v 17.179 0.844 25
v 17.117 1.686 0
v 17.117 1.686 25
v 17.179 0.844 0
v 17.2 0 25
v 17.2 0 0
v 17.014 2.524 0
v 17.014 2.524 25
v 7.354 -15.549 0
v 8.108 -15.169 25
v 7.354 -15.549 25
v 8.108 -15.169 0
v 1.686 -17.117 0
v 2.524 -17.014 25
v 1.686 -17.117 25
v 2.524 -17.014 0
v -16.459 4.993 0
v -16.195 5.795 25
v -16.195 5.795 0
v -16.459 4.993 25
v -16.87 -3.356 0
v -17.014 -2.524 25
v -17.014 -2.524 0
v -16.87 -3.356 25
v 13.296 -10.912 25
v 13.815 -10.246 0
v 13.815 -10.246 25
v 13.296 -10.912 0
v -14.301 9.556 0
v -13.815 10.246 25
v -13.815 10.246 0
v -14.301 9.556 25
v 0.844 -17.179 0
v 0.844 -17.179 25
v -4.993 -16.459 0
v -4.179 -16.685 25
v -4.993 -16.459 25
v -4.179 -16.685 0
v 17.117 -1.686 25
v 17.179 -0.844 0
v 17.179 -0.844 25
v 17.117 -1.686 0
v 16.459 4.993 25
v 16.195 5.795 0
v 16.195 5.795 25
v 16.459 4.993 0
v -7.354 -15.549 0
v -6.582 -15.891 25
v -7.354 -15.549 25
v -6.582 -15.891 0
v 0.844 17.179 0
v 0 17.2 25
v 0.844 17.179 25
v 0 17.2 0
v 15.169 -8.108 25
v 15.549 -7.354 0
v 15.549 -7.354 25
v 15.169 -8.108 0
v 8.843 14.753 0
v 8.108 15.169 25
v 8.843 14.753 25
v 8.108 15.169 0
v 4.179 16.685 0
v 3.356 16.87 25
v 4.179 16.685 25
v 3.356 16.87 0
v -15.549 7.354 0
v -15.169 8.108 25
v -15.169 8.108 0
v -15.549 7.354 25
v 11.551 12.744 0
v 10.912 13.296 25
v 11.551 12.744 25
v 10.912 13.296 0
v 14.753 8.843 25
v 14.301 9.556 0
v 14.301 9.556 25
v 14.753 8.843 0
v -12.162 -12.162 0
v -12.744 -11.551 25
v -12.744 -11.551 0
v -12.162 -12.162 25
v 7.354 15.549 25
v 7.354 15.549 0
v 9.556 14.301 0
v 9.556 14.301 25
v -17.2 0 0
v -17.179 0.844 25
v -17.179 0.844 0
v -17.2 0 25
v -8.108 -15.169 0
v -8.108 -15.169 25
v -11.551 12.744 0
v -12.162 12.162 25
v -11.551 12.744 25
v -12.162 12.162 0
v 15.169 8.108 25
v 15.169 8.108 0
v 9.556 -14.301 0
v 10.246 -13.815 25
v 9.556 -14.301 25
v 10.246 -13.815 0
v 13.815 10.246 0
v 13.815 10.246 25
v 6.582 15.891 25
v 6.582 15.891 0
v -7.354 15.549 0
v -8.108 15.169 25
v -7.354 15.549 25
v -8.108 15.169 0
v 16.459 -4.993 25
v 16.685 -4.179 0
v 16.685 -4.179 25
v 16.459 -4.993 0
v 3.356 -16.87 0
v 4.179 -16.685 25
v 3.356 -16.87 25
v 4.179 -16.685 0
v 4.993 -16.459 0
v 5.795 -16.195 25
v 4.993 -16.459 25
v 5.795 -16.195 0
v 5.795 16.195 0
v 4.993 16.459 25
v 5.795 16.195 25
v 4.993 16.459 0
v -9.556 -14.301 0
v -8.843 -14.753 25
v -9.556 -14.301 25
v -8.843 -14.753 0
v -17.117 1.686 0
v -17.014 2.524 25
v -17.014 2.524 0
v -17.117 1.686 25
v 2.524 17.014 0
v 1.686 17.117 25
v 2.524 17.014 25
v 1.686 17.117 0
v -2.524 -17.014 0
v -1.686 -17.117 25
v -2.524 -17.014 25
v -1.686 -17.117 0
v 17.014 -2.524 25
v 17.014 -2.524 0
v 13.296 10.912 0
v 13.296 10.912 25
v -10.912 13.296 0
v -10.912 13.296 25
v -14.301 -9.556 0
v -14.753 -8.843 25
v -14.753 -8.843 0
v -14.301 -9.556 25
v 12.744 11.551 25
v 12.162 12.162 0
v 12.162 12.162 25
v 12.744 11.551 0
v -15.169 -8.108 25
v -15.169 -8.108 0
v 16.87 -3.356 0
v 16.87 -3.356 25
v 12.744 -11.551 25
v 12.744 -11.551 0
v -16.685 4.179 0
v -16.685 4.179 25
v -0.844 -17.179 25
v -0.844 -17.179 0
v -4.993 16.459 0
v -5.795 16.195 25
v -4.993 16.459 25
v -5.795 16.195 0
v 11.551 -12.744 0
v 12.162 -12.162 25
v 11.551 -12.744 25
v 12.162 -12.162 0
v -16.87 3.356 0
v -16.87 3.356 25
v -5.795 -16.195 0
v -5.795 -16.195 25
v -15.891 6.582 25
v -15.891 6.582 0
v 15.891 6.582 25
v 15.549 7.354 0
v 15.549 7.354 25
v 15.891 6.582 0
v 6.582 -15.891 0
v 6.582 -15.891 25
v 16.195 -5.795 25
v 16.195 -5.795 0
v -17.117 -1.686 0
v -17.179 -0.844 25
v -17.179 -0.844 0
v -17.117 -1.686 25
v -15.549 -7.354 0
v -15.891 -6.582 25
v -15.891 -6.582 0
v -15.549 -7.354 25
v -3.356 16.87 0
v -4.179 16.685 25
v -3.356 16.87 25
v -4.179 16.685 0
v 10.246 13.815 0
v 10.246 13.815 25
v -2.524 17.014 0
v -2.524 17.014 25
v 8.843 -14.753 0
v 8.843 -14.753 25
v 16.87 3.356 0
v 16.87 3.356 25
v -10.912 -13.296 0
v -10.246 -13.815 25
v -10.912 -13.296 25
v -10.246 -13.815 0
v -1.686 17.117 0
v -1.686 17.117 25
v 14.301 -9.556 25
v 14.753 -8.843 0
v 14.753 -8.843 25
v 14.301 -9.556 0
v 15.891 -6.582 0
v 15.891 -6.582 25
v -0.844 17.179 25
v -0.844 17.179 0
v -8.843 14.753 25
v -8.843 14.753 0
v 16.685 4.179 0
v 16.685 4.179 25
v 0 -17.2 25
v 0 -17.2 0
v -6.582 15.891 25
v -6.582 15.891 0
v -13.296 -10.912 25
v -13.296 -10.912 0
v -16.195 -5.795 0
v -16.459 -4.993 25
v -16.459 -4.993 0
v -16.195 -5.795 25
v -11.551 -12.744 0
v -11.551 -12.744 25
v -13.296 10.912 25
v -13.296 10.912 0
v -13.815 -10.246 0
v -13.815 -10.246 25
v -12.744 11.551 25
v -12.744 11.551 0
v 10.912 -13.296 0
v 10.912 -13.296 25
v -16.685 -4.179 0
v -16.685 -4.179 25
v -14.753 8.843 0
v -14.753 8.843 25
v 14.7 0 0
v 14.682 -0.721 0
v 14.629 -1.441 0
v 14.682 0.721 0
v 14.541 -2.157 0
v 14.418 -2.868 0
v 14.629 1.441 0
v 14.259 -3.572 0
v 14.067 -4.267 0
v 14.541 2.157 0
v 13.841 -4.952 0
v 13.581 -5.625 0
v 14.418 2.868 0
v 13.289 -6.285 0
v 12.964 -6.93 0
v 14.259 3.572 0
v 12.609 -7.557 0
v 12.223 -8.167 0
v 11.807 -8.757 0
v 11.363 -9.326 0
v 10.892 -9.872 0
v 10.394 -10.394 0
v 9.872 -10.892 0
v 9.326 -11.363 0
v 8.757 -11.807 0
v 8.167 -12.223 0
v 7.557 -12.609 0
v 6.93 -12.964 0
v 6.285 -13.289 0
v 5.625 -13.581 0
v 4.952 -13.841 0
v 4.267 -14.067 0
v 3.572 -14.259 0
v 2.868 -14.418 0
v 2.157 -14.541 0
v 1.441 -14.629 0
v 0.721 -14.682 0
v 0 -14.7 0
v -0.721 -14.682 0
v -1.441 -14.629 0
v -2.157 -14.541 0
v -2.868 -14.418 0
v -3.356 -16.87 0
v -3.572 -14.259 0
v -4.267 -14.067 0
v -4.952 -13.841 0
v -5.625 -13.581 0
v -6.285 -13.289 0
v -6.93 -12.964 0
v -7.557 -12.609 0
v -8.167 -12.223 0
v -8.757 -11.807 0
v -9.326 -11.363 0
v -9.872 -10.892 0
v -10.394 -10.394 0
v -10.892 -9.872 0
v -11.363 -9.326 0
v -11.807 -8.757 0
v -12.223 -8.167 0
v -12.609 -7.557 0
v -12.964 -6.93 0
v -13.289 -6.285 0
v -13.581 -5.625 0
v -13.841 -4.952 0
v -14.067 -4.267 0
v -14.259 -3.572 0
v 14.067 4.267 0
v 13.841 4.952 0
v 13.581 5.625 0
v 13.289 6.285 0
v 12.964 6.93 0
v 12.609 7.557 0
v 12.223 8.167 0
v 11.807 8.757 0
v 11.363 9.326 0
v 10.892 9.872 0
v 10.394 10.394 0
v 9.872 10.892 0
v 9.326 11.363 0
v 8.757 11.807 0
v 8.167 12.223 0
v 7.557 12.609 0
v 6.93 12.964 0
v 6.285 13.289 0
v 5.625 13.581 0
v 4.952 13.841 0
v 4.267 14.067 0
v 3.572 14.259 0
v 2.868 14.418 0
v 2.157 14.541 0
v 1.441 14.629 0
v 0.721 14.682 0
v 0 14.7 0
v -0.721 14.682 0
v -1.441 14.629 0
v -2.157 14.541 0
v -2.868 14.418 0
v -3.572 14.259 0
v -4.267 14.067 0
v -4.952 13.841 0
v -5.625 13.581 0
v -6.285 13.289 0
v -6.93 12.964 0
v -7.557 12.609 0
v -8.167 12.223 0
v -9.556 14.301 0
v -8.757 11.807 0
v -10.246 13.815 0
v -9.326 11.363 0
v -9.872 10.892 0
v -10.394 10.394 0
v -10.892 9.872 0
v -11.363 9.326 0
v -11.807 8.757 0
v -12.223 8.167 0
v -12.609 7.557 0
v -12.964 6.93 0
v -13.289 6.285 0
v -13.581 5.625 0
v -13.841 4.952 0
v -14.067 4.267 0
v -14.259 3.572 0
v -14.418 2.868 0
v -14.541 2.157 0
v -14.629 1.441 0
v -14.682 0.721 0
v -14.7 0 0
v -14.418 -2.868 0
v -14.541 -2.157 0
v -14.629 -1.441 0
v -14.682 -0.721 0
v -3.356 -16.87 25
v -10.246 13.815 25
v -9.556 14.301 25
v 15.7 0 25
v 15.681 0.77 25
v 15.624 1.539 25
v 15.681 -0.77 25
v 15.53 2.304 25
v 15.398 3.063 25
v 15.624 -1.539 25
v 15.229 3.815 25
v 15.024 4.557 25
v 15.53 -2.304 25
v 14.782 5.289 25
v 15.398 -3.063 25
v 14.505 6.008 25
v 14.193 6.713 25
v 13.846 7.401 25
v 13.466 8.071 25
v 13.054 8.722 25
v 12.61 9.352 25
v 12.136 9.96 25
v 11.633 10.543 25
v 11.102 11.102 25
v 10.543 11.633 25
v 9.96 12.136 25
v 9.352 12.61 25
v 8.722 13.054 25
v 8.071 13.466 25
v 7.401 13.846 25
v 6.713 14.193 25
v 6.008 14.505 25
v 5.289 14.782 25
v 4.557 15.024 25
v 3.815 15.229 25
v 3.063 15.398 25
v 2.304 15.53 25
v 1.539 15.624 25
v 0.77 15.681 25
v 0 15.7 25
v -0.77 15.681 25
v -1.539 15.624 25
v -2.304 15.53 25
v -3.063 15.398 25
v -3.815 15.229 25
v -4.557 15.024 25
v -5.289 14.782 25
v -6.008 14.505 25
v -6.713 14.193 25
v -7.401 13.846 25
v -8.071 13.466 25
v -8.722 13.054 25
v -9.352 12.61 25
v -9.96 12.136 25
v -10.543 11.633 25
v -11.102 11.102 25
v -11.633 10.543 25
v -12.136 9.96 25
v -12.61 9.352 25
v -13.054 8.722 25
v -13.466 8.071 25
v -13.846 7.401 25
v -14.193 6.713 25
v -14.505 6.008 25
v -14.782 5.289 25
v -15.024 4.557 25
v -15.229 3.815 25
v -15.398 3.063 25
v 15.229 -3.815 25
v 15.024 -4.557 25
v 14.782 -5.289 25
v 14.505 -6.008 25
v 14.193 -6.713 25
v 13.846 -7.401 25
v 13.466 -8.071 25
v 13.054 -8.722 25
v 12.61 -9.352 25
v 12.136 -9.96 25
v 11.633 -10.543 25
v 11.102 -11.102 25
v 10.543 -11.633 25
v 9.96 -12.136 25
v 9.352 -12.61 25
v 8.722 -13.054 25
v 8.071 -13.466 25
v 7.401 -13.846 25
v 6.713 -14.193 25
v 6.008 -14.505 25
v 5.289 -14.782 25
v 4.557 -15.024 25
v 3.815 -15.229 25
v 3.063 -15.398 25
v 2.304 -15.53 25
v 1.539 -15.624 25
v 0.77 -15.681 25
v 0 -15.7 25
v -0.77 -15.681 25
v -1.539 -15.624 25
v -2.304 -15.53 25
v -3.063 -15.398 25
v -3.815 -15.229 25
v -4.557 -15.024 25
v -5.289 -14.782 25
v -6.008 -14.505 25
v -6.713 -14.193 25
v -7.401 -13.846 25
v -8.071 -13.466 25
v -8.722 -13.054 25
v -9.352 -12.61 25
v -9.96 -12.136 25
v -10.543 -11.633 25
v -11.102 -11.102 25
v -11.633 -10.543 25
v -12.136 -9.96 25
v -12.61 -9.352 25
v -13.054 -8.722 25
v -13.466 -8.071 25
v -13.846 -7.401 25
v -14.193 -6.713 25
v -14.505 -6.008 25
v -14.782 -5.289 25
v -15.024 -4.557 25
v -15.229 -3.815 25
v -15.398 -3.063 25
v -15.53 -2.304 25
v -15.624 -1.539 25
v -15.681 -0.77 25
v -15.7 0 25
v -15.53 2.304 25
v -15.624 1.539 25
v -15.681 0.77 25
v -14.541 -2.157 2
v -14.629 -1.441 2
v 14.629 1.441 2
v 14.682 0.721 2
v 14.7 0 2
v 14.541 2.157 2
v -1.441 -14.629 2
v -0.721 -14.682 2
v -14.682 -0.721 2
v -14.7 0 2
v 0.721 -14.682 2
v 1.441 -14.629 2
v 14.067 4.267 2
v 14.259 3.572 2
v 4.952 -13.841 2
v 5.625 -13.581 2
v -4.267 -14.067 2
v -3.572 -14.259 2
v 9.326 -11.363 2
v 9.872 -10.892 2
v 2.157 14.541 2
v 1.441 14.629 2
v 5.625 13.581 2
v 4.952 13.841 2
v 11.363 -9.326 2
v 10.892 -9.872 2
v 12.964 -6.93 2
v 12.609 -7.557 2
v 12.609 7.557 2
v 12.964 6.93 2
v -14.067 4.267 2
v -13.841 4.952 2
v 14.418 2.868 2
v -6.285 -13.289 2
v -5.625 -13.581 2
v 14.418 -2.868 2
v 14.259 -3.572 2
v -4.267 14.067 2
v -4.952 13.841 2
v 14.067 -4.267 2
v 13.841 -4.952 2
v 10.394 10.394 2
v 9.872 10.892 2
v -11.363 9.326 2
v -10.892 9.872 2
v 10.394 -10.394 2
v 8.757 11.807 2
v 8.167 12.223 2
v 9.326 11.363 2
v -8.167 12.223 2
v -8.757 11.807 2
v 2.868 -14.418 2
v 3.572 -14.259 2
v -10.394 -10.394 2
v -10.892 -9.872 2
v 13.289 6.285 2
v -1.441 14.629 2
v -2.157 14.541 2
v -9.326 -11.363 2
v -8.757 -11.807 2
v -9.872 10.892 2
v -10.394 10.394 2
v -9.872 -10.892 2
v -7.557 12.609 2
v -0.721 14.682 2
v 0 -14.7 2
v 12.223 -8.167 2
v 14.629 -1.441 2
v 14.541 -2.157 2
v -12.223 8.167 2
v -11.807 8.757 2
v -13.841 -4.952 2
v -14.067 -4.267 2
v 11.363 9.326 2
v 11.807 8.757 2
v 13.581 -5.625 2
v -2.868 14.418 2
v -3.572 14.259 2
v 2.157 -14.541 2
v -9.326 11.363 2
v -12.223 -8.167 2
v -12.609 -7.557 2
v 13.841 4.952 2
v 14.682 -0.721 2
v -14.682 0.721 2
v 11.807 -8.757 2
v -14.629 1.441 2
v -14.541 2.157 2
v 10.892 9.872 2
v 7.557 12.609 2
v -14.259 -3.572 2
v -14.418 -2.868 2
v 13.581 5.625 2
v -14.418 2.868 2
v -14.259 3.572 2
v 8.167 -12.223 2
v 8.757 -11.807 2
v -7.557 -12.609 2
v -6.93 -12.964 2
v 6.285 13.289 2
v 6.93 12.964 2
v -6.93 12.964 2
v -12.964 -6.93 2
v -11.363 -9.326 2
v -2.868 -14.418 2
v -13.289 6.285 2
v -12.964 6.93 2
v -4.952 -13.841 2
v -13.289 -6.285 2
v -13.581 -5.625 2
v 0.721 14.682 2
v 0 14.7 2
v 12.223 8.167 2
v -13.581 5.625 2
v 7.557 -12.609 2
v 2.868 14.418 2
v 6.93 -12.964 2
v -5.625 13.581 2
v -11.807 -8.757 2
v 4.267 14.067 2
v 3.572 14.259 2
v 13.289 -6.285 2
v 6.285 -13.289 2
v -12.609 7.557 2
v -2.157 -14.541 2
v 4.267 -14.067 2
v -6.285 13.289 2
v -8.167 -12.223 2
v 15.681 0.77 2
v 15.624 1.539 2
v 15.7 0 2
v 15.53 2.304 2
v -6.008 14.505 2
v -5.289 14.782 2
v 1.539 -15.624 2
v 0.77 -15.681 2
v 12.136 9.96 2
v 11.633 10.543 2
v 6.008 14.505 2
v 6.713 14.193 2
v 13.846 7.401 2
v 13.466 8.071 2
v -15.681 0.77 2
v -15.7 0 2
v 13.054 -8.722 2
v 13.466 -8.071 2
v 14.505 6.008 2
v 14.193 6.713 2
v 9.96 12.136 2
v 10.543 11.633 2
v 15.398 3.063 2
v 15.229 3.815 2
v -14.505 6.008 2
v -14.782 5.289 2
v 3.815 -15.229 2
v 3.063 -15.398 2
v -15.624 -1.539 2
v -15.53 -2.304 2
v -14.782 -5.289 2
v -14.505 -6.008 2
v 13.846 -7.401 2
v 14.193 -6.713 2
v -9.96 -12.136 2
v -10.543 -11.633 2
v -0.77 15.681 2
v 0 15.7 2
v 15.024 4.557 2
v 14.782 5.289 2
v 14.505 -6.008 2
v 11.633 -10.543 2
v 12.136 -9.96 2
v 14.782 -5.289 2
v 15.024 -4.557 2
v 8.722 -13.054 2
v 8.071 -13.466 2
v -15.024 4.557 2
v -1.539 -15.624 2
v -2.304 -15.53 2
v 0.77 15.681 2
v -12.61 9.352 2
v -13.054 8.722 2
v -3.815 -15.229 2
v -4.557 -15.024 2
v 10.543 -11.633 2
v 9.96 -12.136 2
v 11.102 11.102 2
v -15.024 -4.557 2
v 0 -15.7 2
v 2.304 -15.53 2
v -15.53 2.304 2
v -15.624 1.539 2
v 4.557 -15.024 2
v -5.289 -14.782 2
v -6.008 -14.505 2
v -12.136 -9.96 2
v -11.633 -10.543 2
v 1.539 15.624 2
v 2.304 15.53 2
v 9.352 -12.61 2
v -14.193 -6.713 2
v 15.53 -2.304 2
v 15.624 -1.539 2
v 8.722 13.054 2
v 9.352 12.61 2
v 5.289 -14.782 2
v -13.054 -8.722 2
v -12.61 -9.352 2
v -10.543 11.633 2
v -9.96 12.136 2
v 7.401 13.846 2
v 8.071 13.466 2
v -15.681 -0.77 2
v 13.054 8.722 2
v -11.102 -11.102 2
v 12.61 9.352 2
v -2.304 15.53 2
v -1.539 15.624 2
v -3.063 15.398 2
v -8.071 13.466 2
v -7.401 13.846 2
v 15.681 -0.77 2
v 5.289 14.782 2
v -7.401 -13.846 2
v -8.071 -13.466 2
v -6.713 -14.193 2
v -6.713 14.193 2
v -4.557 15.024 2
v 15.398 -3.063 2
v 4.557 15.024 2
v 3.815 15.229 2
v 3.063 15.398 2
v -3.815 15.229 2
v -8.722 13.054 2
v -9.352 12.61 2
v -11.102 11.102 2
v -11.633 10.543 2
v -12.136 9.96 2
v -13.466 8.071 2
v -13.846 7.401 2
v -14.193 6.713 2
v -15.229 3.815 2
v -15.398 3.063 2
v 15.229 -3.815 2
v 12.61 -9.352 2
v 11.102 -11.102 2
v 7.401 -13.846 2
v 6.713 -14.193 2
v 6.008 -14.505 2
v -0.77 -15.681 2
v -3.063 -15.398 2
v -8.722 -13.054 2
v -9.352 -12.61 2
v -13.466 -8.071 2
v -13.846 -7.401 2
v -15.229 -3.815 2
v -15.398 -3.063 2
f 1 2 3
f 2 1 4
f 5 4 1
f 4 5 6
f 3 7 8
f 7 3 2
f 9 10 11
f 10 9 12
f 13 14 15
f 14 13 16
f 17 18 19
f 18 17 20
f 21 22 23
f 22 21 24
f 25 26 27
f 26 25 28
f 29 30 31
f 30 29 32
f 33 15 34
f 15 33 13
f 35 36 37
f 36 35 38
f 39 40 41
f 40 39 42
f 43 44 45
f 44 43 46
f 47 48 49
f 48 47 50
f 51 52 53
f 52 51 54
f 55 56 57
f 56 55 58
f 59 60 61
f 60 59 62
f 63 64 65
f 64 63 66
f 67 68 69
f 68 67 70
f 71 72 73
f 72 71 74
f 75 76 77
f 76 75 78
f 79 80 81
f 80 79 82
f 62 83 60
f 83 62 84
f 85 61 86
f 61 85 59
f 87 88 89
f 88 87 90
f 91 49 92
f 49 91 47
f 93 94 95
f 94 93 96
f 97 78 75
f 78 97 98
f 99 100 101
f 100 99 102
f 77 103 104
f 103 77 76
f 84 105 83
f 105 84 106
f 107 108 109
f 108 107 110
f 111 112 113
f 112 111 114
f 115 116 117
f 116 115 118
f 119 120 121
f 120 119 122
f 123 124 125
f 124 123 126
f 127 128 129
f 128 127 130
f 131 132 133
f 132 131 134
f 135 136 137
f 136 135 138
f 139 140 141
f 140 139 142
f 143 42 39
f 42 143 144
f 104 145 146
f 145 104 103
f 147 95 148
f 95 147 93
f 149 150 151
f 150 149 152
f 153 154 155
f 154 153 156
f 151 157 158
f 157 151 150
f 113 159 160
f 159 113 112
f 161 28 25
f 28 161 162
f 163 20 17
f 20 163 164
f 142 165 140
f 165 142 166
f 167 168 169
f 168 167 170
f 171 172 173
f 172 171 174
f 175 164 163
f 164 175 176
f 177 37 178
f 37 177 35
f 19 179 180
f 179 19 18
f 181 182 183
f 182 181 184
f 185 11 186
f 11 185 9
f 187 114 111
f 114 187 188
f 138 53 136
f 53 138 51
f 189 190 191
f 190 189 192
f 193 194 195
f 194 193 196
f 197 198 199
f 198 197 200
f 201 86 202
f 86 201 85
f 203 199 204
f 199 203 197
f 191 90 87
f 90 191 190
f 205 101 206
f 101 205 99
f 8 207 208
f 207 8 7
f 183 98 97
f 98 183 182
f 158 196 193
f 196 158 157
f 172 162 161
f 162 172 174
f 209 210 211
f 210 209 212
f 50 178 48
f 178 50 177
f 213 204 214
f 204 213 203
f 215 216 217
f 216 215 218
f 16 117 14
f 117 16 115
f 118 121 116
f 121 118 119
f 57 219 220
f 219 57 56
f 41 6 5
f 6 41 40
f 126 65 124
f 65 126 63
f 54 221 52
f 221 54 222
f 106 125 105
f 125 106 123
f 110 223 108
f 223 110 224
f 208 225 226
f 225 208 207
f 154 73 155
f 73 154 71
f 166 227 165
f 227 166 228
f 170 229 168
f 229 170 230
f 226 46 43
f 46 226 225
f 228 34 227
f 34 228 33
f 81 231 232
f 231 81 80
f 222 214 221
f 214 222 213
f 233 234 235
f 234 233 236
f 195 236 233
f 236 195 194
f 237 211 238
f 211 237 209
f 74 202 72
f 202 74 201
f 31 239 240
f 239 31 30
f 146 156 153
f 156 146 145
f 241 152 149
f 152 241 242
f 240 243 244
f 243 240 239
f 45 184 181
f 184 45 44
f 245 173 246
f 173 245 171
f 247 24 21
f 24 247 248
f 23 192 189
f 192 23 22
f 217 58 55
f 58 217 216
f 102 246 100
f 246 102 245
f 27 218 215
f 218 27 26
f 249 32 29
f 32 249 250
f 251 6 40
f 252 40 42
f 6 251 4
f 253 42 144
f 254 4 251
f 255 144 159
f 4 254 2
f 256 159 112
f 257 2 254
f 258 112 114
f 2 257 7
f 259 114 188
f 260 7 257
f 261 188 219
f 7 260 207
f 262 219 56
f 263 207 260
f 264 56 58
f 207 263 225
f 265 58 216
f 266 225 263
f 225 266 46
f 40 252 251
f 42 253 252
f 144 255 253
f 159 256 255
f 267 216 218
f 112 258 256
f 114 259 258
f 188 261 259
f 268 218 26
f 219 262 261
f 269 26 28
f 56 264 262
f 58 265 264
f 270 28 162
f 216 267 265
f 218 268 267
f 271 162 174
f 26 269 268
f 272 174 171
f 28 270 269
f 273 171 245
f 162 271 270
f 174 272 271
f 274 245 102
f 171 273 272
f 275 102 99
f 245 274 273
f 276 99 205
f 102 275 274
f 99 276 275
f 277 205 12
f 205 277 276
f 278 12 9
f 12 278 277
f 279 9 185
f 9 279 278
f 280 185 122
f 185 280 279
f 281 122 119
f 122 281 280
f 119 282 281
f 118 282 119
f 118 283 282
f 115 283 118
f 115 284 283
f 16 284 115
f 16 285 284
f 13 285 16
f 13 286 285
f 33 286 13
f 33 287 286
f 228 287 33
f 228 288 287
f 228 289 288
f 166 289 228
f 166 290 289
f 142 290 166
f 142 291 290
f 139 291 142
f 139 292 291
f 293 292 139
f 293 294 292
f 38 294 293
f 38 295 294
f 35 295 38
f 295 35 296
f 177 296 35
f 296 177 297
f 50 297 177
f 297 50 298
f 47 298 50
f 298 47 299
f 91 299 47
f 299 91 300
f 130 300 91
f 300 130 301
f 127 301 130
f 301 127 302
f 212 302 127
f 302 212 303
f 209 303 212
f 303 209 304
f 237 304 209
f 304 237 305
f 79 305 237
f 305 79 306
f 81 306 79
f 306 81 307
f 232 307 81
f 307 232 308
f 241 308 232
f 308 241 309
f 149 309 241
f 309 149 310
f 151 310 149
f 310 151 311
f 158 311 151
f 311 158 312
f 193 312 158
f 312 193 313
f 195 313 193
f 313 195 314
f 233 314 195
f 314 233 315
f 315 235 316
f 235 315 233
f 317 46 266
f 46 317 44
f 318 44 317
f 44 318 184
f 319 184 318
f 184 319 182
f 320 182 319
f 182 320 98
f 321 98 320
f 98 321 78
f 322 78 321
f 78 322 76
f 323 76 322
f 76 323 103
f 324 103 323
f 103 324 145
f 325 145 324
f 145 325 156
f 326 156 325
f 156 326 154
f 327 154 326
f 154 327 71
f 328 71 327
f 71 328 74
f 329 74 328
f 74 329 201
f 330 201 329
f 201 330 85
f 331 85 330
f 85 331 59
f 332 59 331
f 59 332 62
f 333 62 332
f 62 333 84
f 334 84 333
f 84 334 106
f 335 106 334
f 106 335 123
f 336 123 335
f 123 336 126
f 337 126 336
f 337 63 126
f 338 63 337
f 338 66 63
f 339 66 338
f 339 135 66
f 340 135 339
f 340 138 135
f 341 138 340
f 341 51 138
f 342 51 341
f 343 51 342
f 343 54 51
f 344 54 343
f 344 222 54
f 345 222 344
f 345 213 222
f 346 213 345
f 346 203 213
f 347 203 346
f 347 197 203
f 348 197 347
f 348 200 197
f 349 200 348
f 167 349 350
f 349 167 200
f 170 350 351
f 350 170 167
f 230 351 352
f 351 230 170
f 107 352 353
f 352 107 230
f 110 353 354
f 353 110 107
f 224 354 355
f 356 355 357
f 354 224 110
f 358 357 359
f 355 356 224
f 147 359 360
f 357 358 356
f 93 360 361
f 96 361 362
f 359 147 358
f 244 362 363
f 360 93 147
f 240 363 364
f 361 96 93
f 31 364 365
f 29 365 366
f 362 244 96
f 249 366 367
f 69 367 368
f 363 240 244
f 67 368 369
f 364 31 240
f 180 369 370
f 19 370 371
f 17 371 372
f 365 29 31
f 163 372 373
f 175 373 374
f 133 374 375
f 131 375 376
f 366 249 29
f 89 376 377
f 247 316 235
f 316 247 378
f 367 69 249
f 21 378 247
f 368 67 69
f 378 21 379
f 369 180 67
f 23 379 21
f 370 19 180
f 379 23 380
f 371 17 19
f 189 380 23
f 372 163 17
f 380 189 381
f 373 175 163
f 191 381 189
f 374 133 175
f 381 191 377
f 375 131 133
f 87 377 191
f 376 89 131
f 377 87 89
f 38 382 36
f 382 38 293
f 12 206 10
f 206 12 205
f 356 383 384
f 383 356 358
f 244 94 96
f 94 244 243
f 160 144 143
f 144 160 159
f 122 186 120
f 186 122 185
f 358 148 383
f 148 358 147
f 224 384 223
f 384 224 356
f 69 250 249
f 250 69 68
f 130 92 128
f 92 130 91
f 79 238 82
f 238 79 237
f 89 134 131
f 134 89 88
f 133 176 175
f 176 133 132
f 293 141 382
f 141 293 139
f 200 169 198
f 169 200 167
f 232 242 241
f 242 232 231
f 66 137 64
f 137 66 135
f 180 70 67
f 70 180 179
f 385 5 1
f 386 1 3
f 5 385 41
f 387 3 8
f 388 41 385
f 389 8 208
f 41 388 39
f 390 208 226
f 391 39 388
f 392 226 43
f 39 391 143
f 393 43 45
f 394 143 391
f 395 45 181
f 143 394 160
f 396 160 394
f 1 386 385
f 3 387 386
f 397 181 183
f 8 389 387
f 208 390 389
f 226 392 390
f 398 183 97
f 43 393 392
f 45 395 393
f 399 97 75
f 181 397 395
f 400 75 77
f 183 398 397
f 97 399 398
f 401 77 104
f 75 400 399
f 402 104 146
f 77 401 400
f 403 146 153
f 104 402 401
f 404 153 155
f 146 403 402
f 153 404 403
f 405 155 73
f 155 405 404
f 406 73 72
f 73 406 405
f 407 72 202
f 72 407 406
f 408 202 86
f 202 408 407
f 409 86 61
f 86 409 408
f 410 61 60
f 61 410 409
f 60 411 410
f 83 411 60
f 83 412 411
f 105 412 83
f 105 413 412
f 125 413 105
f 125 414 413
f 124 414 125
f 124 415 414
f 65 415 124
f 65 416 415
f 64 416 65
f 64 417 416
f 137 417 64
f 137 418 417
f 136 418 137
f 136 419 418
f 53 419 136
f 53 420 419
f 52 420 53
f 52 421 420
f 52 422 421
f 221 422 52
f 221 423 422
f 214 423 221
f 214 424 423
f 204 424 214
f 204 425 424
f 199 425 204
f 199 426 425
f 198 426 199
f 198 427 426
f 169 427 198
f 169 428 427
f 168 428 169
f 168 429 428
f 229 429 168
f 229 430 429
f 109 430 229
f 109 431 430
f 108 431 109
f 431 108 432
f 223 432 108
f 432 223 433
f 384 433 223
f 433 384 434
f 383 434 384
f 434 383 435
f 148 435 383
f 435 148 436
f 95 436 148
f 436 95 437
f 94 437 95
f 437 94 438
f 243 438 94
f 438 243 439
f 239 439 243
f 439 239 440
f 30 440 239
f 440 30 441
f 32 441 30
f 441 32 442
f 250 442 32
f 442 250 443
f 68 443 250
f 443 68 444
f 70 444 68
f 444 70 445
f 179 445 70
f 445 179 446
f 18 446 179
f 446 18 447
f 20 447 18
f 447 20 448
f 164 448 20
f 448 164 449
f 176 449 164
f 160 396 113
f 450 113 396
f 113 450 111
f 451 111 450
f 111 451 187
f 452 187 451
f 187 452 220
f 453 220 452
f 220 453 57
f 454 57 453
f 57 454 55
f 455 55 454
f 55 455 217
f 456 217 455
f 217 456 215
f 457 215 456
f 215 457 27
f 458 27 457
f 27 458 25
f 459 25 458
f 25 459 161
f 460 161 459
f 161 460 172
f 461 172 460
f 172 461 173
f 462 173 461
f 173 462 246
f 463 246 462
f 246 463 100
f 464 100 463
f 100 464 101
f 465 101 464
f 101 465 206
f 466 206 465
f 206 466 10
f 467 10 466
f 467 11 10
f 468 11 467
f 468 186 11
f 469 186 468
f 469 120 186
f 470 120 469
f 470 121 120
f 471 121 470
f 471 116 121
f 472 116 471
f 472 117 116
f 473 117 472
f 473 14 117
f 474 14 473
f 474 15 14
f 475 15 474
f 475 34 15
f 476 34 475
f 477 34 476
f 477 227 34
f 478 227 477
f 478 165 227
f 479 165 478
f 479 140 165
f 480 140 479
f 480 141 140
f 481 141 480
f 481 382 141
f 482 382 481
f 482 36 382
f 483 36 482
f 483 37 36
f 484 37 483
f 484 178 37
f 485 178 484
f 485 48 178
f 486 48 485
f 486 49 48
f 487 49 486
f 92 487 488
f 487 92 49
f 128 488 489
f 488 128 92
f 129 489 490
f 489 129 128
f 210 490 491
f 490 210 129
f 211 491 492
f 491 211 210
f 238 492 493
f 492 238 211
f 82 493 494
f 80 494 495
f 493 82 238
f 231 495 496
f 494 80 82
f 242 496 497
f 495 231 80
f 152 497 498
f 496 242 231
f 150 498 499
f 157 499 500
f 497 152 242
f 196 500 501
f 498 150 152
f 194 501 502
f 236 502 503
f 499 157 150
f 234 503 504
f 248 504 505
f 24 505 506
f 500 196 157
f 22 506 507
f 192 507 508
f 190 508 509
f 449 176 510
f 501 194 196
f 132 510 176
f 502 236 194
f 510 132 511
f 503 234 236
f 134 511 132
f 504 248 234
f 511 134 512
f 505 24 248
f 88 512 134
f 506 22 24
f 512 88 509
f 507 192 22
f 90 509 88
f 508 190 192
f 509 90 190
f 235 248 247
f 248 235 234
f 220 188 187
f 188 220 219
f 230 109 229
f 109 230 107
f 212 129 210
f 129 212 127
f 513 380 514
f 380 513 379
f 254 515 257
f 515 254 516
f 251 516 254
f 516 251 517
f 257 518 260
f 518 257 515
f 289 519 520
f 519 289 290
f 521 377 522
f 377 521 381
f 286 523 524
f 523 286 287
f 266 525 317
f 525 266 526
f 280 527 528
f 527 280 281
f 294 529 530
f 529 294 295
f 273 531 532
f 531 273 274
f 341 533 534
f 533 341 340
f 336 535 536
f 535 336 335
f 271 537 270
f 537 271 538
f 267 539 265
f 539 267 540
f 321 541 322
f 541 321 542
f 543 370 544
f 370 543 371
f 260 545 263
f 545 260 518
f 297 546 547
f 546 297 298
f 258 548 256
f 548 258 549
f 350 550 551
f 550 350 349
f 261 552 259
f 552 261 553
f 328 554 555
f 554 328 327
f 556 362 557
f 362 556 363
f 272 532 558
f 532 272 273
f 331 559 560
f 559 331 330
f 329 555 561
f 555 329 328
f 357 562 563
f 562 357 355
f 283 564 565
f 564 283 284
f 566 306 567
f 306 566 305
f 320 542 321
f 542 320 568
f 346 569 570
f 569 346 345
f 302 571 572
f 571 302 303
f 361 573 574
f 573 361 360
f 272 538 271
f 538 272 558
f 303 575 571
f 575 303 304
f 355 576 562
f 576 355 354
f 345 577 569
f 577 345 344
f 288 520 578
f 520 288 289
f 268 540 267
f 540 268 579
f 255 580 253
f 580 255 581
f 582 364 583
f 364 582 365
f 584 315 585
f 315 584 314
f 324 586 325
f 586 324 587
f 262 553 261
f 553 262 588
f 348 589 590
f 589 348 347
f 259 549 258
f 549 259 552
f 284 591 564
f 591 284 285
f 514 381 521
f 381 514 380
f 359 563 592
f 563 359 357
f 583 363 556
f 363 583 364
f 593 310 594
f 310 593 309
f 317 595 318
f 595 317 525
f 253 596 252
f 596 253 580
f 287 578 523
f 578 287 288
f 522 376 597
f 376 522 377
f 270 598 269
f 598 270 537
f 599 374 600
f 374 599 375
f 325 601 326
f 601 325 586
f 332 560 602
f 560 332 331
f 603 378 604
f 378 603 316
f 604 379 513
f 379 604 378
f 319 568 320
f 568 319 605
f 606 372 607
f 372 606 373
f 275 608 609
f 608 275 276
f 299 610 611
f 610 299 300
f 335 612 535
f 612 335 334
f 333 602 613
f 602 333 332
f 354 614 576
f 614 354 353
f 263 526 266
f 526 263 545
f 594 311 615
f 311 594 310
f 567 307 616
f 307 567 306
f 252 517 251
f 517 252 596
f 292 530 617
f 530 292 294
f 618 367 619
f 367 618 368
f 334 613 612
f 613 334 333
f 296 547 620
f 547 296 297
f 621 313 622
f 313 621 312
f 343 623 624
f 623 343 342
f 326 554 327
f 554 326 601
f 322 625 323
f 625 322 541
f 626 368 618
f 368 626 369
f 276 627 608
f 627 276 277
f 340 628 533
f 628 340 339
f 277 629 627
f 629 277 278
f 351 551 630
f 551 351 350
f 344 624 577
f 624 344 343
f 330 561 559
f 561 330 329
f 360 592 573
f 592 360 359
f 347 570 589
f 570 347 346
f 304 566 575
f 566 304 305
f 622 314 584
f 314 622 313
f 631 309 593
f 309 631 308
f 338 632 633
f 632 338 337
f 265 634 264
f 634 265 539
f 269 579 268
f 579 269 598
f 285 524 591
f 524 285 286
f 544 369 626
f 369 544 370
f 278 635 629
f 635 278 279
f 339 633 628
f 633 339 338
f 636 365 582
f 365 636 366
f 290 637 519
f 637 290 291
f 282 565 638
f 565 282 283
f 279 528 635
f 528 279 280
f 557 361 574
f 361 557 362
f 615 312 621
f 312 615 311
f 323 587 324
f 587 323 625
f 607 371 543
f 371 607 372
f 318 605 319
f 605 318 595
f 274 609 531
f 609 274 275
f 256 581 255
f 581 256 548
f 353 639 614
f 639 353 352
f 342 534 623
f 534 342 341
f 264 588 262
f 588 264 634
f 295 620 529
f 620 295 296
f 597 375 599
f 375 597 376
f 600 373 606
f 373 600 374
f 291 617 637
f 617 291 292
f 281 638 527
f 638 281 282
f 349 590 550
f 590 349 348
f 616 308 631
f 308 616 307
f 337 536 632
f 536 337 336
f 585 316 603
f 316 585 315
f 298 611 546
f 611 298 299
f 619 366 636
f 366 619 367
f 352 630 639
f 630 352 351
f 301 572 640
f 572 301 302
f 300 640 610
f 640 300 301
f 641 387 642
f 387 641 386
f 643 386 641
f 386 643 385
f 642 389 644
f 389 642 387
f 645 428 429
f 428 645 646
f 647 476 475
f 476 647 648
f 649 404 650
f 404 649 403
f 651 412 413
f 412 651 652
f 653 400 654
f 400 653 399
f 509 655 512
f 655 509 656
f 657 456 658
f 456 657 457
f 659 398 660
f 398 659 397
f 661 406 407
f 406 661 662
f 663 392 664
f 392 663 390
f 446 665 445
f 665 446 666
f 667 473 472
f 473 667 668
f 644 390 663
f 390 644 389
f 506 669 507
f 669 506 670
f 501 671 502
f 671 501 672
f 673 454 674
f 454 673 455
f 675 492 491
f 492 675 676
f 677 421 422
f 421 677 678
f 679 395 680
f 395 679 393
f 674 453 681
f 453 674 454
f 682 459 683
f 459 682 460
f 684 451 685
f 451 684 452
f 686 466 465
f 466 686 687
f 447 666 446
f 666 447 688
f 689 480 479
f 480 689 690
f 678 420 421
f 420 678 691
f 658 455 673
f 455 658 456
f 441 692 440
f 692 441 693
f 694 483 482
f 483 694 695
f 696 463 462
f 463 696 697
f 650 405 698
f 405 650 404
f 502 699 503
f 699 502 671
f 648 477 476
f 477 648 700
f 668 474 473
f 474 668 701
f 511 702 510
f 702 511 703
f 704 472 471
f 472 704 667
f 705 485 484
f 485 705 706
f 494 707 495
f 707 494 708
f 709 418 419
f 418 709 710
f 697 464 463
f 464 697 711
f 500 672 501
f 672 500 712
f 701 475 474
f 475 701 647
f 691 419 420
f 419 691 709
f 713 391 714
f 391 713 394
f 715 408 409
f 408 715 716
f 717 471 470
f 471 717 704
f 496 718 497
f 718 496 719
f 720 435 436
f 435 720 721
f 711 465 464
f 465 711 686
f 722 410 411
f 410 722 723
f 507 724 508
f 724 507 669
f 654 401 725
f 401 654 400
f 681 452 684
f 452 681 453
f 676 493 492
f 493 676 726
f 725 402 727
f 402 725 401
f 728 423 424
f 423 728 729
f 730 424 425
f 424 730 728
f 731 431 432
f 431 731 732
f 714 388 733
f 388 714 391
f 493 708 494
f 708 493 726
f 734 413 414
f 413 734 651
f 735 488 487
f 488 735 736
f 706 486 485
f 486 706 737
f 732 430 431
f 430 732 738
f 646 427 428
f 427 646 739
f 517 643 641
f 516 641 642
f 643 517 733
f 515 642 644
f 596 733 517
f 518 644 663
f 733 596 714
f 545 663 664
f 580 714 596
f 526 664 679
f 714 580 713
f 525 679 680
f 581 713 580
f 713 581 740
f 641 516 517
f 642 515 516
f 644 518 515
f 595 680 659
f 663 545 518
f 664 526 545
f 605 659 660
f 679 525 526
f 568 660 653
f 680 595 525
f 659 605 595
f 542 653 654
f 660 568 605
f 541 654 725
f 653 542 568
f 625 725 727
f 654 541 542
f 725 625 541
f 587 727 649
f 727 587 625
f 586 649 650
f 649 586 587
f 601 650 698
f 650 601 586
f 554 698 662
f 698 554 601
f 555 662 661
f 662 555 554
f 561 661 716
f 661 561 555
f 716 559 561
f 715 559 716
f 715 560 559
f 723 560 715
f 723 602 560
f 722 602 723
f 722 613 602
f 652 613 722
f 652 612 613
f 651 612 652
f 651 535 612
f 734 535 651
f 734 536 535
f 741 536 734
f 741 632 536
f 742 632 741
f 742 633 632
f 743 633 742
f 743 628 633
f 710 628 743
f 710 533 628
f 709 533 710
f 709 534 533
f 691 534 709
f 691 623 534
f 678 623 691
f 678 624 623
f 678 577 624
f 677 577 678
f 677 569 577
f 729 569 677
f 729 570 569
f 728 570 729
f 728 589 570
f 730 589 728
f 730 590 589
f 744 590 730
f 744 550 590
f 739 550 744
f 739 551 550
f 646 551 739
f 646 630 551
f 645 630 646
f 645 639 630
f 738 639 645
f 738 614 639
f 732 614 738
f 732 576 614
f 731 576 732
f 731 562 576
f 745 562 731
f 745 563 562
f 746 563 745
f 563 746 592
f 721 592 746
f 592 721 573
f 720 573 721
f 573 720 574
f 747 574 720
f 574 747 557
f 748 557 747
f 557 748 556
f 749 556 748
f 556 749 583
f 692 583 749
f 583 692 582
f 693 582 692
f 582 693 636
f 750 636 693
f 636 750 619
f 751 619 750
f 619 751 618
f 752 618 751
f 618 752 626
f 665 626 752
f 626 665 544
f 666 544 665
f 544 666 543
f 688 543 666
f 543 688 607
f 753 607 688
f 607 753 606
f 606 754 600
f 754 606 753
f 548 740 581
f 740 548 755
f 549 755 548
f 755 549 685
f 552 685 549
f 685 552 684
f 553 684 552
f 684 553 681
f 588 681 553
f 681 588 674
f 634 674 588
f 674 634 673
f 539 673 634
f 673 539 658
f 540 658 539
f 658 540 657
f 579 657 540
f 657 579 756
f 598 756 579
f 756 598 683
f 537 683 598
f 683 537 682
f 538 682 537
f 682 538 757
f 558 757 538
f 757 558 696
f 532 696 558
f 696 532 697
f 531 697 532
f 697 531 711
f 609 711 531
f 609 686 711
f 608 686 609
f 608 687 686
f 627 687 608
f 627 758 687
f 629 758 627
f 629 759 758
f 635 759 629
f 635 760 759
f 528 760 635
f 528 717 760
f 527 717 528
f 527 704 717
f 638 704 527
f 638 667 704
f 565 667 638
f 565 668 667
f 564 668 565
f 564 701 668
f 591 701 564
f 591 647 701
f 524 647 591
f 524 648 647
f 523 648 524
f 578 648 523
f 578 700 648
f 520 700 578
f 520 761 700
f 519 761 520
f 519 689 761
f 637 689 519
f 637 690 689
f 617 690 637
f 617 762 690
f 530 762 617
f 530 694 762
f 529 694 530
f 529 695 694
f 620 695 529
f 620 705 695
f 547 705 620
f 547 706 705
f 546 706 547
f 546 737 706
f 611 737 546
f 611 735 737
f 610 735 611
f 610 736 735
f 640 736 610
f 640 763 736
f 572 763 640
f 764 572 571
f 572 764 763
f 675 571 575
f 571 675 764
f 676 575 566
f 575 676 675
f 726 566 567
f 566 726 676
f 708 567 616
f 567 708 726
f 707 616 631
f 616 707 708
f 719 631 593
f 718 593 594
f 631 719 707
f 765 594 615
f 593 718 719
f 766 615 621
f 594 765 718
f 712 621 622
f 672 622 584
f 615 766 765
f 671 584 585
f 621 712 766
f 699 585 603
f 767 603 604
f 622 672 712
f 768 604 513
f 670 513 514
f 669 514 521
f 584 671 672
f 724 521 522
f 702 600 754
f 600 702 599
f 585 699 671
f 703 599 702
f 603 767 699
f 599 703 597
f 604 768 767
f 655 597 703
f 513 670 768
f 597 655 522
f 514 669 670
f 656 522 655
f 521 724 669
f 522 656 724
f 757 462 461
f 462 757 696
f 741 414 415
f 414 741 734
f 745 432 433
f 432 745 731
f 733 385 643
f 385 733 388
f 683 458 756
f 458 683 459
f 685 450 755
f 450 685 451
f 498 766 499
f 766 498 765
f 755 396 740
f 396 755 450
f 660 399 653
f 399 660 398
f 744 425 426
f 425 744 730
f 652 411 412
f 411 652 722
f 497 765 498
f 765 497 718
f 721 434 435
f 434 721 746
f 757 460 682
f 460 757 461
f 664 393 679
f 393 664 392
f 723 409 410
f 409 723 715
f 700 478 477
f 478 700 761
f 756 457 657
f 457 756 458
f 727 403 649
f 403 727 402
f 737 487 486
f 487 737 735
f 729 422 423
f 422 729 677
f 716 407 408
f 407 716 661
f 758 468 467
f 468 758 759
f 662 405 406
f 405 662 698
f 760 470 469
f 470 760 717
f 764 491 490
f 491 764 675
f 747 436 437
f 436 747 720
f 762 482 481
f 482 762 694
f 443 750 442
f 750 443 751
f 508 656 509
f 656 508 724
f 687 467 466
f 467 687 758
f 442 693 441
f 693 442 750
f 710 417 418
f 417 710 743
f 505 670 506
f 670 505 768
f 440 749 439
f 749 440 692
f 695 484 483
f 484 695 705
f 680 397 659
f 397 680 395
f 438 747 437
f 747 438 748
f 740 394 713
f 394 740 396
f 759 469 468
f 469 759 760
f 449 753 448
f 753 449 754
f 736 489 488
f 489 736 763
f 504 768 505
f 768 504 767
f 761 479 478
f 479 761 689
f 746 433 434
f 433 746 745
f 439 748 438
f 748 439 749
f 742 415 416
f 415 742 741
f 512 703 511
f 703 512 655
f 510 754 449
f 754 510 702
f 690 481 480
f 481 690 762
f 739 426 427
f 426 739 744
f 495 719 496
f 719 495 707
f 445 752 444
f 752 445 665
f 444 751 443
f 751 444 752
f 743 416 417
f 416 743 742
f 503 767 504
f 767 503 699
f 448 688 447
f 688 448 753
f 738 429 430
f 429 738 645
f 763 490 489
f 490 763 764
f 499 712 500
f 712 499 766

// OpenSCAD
// Retaining cap for a polycarbonate lens

// Units are in mm
$fn= $preview ? 32 : 128;
epsilon = $preview ? 0.005 : 0;

function InchToMillis(inch) = inch * 25.4;
function MillisToInch(mm) = mm / 25.4;

innerDiameter = 31.4;
wallThickness = 1.5;
length = 25;
lipWidth = 2;
lipThickness = 2;

outerDiam = innerDiameter + wallThickness * 2;

difference()
{
    cylinder(length, d = outerDiam);
    cylinder(length, d = innerDiameter - lipWidth);
    translate([0, 0, lipThickness])
    cylinder(length, d = innerDiameter);
}
